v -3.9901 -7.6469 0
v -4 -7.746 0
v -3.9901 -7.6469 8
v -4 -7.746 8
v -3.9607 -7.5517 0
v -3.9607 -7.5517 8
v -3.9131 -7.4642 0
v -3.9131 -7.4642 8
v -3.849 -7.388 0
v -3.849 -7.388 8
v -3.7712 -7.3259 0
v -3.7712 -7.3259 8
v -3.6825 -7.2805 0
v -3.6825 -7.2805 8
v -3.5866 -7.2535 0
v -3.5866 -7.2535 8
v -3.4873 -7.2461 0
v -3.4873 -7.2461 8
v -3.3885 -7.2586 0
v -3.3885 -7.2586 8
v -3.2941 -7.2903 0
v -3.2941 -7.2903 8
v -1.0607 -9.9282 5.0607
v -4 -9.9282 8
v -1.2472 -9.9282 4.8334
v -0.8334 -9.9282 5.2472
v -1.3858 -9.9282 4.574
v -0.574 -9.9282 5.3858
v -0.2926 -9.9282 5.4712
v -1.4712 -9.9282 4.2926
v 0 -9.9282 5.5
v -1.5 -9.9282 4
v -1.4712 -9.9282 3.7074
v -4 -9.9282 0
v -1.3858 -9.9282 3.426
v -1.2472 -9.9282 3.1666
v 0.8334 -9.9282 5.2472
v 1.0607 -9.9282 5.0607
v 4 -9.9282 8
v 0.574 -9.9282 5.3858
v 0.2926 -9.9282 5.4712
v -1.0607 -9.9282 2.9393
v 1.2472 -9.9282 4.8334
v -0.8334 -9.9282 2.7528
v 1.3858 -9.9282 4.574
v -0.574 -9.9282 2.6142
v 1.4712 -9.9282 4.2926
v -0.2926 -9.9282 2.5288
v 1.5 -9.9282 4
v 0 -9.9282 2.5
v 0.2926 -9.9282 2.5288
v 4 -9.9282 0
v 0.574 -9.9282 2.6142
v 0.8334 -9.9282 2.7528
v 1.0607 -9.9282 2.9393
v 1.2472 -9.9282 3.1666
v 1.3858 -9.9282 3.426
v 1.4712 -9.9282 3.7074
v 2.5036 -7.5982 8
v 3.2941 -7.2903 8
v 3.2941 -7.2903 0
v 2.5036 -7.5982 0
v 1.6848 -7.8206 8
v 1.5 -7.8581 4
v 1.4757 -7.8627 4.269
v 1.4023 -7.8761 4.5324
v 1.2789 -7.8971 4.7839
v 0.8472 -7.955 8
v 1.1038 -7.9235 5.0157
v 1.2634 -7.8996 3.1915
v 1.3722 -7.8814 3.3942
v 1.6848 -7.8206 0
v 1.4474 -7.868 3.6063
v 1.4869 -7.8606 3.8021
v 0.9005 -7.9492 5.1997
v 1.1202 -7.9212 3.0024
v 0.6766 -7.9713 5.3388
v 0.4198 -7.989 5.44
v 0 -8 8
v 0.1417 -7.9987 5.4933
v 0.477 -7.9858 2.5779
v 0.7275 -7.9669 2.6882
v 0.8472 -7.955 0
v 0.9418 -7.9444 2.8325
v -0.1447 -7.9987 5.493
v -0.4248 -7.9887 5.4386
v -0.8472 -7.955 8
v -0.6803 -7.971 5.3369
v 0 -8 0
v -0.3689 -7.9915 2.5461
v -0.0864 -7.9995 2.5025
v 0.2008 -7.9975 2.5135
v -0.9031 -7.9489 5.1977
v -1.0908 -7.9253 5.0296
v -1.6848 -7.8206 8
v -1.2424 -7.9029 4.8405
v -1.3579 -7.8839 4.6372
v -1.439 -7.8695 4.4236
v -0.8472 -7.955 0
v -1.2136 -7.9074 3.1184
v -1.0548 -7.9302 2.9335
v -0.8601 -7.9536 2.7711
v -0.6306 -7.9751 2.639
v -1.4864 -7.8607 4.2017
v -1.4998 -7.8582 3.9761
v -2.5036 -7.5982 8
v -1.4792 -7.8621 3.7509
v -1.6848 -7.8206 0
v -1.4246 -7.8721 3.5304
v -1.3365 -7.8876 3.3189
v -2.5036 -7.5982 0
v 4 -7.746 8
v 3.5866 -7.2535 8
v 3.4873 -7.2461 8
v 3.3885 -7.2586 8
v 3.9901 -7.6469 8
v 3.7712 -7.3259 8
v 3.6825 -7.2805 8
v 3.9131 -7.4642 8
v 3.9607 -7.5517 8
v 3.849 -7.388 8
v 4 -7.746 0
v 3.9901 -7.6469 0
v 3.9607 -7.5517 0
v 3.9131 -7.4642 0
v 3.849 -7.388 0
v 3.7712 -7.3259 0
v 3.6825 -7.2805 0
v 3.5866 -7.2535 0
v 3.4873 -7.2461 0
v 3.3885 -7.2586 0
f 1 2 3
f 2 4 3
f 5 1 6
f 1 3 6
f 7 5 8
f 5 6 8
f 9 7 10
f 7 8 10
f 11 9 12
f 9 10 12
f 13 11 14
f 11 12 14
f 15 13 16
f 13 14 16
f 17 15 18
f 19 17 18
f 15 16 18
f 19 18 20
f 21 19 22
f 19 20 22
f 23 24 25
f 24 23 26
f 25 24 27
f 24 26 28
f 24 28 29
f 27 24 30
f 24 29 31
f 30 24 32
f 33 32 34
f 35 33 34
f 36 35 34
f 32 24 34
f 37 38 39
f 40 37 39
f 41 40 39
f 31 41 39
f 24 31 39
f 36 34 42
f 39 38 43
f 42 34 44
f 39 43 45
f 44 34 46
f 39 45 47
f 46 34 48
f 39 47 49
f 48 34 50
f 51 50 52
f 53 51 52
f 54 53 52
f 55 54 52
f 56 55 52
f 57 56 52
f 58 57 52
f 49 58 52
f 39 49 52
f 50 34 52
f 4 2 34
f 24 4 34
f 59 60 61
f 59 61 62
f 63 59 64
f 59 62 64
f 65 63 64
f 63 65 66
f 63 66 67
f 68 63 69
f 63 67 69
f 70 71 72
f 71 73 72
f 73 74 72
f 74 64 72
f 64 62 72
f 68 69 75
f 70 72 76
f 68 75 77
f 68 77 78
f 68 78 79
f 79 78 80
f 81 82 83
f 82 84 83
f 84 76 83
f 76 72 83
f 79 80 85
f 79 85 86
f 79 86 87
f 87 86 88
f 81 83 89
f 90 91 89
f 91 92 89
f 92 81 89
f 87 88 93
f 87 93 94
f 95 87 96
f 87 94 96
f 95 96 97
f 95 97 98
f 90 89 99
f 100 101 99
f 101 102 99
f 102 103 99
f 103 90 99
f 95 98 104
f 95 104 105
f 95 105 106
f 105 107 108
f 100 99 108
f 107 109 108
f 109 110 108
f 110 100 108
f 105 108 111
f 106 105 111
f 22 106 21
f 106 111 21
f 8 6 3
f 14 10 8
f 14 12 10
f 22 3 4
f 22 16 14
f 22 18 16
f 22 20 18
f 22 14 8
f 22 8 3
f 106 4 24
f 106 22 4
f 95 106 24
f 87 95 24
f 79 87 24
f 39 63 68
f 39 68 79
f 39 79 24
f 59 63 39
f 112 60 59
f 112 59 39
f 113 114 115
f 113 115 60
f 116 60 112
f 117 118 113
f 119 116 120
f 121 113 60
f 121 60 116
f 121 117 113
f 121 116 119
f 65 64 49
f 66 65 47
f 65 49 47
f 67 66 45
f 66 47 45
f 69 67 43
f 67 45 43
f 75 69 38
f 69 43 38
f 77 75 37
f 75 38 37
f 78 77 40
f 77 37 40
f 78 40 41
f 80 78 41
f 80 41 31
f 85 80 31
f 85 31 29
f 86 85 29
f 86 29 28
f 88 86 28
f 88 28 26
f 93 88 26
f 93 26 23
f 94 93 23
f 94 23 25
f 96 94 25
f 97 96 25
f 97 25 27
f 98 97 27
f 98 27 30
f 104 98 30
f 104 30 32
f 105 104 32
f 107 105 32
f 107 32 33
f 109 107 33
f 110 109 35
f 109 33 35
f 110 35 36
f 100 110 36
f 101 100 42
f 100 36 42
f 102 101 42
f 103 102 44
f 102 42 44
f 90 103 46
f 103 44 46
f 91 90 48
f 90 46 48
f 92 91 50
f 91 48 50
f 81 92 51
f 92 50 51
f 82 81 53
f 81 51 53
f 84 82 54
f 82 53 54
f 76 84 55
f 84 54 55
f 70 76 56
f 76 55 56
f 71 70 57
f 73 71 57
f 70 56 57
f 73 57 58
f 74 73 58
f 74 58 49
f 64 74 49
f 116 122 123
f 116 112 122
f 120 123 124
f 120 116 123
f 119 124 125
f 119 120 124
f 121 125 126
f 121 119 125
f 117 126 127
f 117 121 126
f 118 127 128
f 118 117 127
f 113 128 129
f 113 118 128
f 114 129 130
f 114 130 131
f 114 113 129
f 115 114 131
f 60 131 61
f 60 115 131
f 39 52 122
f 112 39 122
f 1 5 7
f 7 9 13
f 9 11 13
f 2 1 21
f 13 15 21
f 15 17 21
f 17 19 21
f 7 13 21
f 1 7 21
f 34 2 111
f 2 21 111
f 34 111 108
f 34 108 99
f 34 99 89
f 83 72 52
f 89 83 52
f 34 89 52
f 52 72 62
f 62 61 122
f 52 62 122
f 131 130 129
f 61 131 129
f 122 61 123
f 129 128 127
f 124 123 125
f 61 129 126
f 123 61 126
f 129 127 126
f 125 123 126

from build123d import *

# Parameters (mm, degrees)
BOSS_EXTRUDE1_DEPTH = 8
FILLET1_R           = 0.5
SKETCH2_R           = 1.5
CUT_EXTRUDE1_DEPTH  = 3.682236538


with BuildPart() as part:
    # Sketch1 → Boss-Extrude1 (new body)
    with BuildSketch(Plane.XY):
        with BuildLine():
            Line((-4, -6.92820323), (-4, -9.92820323))
            Line((-4, -9.92820323), (4, -9.92820323))
            Line((4, -9.92820323), (4, -6.92820323))
            ThreePointArc((4, -6.92820323), (0, -8), (-4, -6.92820323))
        make_face()
    extrude(amount=BOSS_EXTRUDE1_DEPTH)

    # Fillet1
    fillet1_edges = [part.edges().sort_by_distance(p)[0] for p in [
        (4, -6.92820323, 4),
        (-4, -6.92820323, 4),
    ]]
    fillet(fillet1_edges, radius=FILLET1_R)

    # Sketch2 → Cut-Extrude1 (cut, through all)
    with BuildSketch(Plane.XZ.offset(9.92820323)):
        with Locations((0, 4)):
            Circle(SKETCH2_R)
    extrude(amount=-CUT_EXTRUDE1_DEPTH, mode=Mode.SUBTRACT)


solid = part.part
